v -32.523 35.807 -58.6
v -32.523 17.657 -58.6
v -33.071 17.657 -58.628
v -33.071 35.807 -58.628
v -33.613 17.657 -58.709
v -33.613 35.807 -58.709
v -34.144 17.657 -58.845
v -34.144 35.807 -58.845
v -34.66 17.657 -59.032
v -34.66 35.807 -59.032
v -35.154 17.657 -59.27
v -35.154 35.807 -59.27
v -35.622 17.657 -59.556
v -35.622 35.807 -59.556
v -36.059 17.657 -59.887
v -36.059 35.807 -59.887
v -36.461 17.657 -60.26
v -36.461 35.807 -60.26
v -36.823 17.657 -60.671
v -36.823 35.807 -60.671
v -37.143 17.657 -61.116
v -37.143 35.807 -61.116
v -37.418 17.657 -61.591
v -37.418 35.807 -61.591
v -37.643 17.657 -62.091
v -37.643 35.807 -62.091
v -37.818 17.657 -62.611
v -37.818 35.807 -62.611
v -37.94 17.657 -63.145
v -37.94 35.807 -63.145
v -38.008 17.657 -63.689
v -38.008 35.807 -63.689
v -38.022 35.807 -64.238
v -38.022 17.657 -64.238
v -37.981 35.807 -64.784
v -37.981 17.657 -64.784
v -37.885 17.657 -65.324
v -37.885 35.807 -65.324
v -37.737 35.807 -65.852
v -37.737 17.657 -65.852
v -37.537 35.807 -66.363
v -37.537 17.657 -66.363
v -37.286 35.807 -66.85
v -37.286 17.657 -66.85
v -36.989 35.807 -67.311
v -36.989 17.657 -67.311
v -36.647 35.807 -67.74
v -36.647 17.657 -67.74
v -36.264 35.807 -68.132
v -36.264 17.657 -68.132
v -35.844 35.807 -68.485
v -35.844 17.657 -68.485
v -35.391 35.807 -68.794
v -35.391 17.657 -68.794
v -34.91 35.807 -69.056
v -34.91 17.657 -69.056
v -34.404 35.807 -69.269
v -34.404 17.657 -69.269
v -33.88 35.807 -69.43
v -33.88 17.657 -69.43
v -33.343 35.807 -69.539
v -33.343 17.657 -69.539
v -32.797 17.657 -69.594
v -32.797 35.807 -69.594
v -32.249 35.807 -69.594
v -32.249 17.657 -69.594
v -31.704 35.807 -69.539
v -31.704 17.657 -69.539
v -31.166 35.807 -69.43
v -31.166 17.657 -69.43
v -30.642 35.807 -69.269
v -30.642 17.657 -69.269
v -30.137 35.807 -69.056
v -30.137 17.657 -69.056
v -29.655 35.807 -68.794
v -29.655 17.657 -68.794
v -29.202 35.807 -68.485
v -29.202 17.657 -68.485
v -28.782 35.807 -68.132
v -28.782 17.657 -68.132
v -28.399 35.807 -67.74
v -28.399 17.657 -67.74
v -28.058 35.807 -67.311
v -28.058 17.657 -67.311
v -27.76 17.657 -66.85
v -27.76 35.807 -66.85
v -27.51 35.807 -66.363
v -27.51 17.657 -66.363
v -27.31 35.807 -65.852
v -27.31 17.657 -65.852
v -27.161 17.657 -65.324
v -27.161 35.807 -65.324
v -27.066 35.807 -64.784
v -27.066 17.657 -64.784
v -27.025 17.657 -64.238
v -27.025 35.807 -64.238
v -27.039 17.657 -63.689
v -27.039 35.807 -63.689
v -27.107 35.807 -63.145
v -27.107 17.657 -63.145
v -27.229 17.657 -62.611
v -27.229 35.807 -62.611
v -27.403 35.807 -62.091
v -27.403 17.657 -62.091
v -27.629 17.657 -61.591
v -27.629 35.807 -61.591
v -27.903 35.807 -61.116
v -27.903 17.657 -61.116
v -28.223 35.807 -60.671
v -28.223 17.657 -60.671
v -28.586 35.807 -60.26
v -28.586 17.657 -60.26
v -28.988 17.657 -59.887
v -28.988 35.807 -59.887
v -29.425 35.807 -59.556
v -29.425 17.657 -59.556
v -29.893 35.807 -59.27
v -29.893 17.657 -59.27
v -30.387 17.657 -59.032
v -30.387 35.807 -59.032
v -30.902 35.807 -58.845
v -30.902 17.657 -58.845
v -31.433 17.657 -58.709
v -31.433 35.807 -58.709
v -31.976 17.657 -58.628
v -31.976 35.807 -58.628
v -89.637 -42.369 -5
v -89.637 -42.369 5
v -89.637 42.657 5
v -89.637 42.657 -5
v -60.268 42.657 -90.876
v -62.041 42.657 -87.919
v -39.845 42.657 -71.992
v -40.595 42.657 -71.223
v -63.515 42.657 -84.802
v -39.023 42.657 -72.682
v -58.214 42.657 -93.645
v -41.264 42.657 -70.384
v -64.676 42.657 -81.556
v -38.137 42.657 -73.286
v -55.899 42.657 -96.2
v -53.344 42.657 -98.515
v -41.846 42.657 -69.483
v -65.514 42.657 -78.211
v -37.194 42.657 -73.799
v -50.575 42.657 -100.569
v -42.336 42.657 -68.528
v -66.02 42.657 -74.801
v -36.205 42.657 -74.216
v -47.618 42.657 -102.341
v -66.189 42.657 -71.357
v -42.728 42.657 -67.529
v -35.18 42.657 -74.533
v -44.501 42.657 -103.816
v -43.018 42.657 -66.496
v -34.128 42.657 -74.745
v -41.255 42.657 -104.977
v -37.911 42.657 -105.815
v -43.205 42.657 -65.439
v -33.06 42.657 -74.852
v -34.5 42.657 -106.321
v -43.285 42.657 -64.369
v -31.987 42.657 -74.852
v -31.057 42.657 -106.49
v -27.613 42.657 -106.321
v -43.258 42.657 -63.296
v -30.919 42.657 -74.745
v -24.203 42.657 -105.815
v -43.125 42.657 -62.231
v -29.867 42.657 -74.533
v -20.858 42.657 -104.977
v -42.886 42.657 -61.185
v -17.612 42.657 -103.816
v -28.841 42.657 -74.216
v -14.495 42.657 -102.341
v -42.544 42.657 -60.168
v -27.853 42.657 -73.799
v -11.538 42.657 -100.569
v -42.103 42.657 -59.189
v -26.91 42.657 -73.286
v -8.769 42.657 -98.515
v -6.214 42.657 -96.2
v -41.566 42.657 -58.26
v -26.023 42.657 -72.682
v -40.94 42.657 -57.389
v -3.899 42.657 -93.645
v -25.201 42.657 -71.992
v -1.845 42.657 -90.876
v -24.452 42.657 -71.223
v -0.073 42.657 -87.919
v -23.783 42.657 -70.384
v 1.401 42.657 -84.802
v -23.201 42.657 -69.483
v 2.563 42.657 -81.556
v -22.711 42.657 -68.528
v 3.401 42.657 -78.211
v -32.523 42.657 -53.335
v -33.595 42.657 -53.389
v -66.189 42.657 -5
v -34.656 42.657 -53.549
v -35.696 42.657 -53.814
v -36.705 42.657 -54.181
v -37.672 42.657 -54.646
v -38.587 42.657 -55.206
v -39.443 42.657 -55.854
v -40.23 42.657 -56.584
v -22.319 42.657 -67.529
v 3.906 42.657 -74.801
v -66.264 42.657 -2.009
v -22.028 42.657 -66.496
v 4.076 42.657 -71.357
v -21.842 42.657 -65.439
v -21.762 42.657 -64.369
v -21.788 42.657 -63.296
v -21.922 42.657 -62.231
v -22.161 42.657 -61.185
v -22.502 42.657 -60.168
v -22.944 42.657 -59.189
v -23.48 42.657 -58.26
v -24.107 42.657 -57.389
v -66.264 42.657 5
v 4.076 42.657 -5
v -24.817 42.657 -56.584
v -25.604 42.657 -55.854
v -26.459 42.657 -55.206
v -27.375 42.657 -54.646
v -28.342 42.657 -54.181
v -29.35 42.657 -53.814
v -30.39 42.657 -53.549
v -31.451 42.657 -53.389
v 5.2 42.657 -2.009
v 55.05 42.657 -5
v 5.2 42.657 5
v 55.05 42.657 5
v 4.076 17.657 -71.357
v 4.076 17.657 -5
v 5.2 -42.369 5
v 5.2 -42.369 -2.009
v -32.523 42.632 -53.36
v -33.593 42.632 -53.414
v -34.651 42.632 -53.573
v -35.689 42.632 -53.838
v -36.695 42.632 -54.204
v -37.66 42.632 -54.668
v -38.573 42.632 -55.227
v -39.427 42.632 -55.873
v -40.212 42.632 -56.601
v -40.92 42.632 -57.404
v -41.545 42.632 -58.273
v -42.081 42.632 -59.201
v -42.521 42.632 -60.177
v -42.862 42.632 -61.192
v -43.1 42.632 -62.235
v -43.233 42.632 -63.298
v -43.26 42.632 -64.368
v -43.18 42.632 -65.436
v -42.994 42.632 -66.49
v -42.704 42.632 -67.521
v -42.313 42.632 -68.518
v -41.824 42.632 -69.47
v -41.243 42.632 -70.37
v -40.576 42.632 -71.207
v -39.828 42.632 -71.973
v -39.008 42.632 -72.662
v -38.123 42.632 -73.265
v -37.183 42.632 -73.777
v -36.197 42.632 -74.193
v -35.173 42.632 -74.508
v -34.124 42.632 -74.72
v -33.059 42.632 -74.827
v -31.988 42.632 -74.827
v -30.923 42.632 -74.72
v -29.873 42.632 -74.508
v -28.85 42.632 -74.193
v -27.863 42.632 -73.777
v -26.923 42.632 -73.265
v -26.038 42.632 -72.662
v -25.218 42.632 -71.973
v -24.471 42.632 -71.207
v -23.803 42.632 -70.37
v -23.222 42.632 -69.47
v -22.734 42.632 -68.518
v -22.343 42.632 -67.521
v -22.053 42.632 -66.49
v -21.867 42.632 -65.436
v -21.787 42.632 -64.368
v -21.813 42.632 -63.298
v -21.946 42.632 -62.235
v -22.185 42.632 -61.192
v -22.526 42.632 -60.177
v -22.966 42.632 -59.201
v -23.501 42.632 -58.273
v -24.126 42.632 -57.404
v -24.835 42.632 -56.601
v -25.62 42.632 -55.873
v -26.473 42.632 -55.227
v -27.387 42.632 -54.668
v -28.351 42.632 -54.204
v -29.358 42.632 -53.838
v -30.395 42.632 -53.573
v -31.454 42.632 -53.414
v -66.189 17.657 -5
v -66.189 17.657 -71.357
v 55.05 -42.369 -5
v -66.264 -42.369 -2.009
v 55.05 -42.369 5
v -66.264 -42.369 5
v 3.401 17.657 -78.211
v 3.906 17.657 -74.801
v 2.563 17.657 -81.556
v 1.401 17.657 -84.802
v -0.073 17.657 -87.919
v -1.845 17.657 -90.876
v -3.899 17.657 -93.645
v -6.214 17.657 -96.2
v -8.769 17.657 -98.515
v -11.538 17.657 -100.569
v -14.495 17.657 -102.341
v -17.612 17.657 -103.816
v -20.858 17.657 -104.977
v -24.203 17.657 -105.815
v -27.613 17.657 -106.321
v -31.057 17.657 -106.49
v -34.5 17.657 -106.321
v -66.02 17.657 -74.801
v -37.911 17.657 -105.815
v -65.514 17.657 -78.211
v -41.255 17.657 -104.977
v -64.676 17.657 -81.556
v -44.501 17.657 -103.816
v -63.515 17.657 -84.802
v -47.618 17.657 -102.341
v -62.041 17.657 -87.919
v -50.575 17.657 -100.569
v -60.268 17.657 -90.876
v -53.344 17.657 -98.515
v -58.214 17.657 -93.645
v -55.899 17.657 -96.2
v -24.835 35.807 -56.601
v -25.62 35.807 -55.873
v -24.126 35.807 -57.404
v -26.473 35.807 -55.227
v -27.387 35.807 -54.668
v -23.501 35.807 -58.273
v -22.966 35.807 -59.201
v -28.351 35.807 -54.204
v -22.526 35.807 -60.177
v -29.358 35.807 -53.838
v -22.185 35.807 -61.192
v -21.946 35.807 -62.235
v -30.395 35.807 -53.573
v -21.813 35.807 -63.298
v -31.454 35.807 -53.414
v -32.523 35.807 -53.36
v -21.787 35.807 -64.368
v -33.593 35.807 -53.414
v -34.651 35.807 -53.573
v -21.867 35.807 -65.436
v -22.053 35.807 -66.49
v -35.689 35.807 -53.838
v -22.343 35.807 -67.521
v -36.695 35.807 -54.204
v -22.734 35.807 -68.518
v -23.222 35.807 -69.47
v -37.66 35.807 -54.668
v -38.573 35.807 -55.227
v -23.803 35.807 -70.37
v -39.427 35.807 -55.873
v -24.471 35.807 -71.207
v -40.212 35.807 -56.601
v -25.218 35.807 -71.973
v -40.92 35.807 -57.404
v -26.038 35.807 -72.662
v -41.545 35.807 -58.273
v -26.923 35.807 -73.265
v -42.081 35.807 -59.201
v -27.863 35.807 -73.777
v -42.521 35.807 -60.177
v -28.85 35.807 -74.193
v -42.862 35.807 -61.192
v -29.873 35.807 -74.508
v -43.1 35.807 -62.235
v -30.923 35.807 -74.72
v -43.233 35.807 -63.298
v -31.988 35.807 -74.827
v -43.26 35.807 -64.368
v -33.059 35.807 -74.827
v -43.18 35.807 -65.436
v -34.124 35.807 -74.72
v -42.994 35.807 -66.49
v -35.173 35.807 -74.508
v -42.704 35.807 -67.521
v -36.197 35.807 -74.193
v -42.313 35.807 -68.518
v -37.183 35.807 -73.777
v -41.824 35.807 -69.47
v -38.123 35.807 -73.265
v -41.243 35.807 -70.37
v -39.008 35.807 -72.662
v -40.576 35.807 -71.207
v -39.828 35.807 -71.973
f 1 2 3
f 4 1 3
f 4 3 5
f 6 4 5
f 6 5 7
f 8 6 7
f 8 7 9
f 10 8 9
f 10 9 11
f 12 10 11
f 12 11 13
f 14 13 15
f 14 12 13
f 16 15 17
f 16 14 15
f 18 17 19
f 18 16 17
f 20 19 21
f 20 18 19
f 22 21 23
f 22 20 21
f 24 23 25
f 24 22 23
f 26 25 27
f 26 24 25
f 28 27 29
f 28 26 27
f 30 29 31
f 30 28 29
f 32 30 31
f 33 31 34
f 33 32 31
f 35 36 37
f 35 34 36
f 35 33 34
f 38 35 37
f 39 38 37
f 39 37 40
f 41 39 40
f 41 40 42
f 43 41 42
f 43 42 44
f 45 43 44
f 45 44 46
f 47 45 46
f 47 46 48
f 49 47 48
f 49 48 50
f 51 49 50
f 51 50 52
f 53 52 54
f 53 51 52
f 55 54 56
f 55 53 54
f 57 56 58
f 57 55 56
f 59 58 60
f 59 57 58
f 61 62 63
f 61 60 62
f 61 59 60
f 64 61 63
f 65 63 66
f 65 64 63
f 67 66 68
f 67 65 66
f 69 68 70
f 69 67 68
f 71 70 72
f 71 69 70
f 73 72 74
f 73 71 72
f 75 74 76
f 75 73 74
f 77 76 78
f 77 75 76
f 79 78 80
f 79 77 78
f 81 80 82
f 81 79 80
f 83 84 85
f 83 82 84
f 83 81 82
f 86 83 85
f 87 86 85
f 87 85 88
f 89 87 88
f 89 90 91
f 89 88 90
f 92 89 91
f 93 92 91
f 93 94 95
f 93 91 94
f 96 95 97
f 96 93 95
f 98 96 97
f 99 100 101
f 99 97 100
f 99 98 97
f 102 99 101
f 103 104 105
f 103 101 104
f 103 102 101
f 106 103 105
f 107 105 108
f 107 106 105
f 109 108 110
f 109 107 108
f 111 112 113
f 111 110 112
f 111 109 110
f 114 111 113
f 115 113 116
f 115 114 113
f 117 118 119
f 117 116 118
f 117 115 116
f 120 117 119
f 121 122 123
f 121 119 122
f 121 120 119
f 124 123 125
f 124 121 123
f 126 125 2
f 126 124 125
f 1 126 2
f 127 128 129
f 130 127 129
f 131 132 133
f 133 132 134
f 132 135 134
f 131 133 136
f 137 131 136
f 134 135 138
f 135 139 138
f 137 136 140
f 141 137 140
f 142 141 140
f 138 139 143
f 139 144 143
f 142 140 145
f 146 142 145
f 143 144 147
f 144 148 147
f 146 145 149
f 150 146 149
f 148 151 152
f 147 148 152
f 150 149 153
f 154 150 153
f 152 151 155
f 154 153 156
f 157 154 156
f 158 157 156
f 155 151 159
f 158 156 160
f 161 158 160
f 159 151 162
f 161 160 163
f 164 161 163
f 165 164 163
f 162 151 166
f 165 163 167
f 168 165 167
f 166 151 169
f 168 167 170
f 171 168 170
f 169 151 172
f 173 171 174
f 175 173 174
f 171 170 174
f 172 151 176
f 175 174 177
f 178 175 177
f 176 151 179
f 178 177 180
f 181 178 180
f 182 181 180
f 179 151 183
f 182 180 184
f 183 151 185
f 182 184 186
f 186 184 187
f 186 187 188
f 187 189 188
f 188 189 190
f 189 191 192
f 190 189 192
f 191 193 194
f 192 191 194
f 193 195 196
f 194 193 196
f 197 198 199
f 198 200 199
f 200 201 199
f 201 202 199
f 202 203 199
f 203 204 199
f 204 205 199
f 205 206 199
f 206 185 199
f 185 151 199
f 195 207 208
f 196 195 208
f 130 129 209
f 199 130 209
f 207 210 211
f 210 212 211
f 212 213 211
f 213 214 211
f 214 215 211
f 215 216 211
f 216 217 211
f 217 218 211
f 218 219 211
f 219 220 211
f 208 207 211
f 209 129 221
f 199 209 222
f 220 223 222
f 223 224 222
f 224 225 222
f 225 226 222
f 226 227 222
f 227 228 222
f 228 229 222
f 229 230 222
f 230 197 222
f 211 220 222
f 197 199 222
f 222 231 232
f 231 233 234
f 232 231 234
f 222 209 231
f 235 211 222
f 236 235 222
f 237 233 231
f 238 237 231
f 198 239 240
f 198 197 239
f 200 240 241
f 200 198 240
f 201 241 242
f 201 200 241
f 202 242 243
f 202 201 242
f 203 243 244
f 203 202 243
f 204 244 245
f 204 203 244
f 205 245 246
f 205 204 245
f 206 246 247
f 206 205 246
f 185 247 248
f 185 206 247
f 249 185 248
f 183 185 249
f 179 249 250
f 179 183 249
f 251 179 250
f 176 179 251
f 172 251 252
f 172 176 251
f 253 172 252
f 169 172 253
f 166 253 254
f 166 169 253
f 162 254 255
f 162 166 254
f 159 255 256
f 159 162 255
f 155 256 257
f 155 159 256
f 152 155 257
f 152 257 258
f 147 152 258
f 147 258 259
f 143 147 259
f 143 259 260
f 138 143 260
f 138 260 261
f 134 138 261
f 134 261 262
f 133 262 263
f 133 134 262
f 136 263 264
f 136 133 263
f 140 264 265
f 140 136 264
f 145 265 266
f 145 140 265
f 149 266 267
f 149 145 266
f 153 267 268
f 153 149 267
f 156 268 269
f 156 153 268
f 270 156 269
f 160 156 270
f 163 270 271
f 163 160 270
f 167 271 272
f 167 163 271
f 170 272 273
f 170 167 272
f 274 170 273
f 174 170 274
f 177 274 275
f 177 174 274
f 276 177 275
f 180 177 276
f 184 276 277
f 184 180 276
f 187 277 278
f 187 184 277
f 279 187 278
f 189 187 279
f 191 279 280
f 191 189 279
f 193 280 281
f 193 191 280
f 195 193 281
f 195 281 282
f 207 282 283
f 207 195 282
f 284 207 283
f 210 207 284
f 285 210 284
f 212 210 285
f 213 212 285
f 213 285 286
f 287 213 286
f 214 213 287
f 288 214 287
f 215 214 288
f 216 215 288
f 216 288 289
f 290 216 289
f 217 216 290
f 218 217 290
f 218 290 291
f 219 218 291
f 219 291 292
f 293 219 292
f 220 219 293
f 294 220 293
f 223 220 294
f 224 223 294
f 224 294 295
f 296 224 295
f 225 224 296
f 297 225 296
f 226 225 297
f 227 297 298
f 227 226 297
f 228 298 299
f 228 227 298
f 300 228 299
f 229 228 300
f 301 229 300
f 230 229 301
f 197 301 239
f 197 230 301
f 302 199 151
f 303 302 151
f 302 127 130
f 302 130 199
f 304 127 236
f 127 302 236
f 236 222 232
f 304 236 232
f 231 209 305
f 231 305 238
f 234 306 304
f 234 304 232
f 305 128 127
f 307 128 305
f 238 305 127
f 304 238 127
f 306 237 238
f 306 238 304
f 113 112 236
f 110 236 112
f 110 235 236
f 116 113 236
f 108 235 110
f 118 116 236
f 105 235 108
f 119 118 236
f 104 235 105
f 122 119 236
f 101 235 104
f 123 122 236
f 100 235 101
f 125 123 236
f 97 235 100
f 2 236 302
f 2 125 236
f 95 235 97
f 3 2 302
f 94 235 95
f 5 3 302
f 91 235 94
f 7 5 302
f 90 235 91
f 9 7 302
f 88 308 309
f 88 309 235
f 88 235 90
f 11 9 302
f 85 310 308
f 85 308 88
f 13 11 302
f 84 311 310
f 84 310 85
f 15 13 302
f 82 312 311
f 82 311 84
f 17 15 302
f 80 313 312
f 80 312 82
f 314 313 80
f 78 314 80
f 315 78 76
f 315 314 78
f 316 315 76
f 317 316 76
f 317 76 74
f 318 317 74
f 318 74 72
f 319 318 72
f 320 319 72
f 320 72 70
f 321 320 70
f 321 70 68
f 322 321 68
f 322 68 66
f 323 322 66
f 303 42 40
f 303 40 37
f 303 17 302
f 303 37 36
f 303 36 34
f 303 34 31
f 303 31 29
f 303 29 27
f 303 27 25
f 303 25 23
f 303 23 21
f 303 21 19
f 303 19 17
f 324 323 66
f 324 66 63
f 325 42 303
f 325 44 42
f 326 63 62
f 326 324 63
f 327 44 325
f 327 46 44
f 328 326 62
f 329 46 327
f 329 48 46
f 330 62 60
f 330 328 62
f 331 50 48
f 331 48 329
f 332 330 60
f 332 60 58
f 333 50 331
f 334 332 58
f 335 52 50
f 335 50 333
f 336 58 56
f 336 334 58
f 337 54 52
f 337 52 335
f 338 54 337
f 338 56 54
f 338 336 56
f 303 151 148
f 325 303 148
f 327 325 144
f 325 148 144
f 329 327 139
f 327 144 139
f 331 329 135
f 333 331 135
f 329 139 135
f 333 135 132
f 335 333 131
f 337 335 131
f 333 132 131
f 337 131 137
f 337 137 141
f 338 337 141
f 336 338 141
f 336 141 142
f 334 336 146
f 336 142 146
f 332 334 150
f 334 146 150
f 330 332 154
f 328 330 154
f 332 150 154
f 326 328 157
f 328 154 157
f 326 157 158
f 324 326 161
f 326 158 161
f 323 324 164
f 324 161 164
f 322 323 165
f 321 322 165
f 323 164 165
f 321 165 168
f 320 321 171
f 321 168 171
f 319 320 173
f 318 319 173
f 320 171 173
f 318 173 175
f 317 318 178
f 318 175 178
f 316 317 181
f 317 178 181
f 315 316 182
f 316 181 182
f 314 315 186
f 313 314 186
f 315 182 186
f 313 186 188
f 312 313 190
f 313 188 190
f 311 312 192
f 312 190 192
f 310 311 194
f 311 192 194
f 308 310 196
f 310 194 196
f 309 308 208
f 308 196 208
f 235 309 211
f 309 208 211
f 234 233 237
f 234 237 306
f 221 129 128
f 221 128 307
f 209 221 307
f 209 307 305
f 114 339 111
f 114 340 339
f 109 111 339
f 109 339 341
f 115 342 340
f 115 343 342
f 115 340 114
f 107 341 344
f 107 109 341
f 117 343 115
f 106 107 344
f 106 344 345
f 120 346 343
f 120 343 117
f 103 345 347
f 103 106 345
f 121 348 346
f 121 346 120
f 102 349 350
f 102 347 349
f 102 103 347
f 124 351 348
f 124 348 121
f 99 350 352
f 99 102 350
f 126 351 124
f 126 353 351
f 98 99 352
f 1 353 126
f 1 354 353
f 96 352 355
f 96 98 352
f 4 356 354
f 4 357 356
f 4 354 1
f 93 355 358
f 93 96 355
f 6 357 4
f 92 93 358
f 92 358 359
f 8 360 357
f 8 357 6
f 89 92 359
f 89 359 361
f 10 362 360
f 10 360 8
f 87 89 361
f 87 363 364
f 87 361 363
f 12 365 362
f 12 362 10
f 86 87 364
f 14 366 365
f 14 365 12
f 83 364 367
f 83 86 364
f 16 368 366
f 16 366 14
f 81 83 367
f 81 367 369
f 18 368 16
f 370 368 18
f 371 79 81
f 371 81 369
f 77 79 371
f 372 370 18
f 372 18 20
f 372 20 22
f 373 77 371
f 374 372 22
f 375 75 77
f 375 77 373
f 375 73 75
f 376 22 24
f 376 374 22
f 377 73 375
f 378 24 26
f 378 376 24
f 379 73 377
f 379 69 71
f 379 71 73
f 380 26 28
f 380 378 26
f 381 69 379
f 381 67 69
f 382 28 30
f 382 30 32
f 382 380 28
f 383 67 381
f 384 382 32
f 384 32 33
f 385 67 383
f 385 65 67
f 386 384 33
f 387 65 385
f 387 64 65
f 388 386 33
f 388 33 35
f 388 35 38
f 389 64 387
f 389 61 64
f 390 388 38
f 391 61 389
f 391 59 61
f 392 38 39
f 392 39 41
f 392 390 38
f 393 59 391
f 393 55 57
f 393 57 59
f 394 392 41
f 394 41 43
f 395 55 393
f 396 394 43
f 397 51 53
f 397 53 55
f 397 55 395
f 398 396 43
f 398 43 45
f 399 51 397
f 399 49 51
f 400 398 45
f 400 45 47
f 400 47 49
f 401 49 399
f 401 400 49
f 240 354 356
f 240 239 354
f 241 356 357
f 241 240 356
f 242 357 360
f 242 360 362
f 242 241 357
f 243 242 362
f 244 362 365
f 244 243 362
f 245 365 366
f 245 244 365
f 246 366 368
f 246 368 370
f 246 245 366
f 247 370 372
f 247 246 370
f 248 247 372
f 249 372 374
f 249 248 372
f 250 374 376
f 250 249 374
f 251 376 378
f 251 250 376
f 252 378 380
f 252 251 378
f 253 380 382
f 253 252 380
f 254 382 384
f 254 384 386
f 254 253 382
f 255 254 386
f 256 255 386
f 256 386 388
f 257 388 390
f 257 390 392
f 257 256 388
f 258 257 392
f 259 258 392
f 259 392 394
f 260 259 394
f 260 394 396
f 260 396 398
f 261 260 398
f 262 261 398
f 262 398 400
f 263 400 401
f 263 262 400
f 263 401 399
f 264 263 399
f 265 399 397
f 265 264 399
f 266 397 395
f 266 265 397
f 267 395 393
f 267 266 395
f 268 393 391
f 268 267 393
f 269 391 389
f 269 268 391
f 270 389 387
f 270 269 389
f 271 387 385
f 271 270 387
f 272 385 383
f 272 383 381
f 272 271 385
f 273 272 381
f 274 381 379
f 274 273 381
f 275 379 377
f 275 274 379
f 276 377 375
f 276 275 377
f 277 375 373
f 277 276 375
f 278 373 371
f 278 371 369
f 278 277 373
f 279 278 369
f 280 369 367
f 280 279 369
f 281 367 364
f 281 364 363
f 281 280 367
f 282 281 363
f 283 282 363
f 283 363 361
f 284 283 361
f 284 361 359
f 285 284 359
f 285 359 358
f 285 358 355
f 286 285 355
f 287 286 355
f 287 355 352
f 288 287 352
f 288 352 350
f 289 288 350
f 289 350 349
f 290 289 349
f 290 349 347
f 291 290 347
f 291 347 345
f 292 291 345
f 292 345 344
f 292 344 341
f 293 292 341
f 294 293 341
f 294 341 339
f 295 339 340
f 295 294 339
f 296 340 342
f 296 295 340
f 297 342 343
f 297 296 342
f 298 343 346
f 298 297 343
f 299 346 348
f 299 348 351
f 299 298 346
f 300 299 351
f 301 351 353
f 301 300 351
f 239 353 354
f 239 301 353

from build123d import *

# Parameters (mm, degrees)
ESBO_O2_W                   = 144.687309412
ESBO_O2_H                   = 85.02541091
RESSALTO_EXTRUS_O2_DEPTH    = 5
RESSALTO_EXTRUS_O7_DEPTH    = 25
CORTE_EXTRUS_O11_DEPTH      = 164.107898205
CORTE_EXTRUS_O11_DEPTH_BACK = 164.107898205
ESBO_O16_W                  = 71.463749888
ESBO_O16_H                  = 7.00897528


with BuildPart() as part:
    # Esboço2 → Ressalto-extrusão2 (new, symmetric)
    with BuildSketch(Plane.XY):
        with Locations((-17.293303914, 0.144110866)):
            Rectangle(ESBO_O2_W, ESBO_O2_H)
    extrude(amount=RESSALTO_EXTRUS_O2_DEPTH, both=True)

    # Esboço4 → Ressalto-extrusão7 (add)
    with BuildSketch(Plane(origin=(0, 42.656816321, 0), x_dir=(1, 0, 0), z_dir=(0, 1, 0))):
        with BuildLine():
            Line((-66.189068435, 5), (-66.189068435, 71.35749318))
            ThreePointArc((-66.189068435, 71.35749318), (-31.056742356, 106.489819259), (4.075583724, 71.35749318))
            Line((4.075583724, 71.35749318), (4.075583724, 5))
            Line((4.075583724, 5), (-66.189068435, 5))
        make_face()
    extrude(amount=-RESSALTO_EXTRUS_O7_DEPTH)

    # Esboço13 → Rebaixo para parafuso de cabeça sextavada de M101 (revolve, cut)
    with BuildSketch(Plane(origin=(-32.523283398, 42.656816321, -64.100430101), x_dir=(0, 0, 1), z_dir=(1, 0, 0))):
        Polygon((0, 0), (0, 85.025410909), (5.5, 85.025410909), (5.5, 6.85), (10.74, 6.85), (10.74, 0.025), (10.765, 0), align=None)
    revolve(axis=Axis((-32.523283398, 49.006816321, -64.100430101), (0, -1, 0)), mode=Mode.SUBTRACT)

    # Esboço16 → Corte-extrusão11 (cut, two sides: drawn at the far end of the back side and taken through both)
    with BuildSketch(Plane(origin=(0, 42.656816321, 0), x_dir=(1, 0, 0), z_dir=(0, 1, 0)).offset(-CORTE_EXTRUS_O11_DEPTH_BACK)):
        with Locations((-30.531670696, -1.49551236)):
            Rectangle(ESBO_O16_W, ESBO_O16_H)
    extrude(amount=CORTE_EXTRUS_O11_DEPTH + CORTE_EXTRUS_O11_DEPTH_BACK, mode=Mode.SUBTRACT)


solid = part.part
